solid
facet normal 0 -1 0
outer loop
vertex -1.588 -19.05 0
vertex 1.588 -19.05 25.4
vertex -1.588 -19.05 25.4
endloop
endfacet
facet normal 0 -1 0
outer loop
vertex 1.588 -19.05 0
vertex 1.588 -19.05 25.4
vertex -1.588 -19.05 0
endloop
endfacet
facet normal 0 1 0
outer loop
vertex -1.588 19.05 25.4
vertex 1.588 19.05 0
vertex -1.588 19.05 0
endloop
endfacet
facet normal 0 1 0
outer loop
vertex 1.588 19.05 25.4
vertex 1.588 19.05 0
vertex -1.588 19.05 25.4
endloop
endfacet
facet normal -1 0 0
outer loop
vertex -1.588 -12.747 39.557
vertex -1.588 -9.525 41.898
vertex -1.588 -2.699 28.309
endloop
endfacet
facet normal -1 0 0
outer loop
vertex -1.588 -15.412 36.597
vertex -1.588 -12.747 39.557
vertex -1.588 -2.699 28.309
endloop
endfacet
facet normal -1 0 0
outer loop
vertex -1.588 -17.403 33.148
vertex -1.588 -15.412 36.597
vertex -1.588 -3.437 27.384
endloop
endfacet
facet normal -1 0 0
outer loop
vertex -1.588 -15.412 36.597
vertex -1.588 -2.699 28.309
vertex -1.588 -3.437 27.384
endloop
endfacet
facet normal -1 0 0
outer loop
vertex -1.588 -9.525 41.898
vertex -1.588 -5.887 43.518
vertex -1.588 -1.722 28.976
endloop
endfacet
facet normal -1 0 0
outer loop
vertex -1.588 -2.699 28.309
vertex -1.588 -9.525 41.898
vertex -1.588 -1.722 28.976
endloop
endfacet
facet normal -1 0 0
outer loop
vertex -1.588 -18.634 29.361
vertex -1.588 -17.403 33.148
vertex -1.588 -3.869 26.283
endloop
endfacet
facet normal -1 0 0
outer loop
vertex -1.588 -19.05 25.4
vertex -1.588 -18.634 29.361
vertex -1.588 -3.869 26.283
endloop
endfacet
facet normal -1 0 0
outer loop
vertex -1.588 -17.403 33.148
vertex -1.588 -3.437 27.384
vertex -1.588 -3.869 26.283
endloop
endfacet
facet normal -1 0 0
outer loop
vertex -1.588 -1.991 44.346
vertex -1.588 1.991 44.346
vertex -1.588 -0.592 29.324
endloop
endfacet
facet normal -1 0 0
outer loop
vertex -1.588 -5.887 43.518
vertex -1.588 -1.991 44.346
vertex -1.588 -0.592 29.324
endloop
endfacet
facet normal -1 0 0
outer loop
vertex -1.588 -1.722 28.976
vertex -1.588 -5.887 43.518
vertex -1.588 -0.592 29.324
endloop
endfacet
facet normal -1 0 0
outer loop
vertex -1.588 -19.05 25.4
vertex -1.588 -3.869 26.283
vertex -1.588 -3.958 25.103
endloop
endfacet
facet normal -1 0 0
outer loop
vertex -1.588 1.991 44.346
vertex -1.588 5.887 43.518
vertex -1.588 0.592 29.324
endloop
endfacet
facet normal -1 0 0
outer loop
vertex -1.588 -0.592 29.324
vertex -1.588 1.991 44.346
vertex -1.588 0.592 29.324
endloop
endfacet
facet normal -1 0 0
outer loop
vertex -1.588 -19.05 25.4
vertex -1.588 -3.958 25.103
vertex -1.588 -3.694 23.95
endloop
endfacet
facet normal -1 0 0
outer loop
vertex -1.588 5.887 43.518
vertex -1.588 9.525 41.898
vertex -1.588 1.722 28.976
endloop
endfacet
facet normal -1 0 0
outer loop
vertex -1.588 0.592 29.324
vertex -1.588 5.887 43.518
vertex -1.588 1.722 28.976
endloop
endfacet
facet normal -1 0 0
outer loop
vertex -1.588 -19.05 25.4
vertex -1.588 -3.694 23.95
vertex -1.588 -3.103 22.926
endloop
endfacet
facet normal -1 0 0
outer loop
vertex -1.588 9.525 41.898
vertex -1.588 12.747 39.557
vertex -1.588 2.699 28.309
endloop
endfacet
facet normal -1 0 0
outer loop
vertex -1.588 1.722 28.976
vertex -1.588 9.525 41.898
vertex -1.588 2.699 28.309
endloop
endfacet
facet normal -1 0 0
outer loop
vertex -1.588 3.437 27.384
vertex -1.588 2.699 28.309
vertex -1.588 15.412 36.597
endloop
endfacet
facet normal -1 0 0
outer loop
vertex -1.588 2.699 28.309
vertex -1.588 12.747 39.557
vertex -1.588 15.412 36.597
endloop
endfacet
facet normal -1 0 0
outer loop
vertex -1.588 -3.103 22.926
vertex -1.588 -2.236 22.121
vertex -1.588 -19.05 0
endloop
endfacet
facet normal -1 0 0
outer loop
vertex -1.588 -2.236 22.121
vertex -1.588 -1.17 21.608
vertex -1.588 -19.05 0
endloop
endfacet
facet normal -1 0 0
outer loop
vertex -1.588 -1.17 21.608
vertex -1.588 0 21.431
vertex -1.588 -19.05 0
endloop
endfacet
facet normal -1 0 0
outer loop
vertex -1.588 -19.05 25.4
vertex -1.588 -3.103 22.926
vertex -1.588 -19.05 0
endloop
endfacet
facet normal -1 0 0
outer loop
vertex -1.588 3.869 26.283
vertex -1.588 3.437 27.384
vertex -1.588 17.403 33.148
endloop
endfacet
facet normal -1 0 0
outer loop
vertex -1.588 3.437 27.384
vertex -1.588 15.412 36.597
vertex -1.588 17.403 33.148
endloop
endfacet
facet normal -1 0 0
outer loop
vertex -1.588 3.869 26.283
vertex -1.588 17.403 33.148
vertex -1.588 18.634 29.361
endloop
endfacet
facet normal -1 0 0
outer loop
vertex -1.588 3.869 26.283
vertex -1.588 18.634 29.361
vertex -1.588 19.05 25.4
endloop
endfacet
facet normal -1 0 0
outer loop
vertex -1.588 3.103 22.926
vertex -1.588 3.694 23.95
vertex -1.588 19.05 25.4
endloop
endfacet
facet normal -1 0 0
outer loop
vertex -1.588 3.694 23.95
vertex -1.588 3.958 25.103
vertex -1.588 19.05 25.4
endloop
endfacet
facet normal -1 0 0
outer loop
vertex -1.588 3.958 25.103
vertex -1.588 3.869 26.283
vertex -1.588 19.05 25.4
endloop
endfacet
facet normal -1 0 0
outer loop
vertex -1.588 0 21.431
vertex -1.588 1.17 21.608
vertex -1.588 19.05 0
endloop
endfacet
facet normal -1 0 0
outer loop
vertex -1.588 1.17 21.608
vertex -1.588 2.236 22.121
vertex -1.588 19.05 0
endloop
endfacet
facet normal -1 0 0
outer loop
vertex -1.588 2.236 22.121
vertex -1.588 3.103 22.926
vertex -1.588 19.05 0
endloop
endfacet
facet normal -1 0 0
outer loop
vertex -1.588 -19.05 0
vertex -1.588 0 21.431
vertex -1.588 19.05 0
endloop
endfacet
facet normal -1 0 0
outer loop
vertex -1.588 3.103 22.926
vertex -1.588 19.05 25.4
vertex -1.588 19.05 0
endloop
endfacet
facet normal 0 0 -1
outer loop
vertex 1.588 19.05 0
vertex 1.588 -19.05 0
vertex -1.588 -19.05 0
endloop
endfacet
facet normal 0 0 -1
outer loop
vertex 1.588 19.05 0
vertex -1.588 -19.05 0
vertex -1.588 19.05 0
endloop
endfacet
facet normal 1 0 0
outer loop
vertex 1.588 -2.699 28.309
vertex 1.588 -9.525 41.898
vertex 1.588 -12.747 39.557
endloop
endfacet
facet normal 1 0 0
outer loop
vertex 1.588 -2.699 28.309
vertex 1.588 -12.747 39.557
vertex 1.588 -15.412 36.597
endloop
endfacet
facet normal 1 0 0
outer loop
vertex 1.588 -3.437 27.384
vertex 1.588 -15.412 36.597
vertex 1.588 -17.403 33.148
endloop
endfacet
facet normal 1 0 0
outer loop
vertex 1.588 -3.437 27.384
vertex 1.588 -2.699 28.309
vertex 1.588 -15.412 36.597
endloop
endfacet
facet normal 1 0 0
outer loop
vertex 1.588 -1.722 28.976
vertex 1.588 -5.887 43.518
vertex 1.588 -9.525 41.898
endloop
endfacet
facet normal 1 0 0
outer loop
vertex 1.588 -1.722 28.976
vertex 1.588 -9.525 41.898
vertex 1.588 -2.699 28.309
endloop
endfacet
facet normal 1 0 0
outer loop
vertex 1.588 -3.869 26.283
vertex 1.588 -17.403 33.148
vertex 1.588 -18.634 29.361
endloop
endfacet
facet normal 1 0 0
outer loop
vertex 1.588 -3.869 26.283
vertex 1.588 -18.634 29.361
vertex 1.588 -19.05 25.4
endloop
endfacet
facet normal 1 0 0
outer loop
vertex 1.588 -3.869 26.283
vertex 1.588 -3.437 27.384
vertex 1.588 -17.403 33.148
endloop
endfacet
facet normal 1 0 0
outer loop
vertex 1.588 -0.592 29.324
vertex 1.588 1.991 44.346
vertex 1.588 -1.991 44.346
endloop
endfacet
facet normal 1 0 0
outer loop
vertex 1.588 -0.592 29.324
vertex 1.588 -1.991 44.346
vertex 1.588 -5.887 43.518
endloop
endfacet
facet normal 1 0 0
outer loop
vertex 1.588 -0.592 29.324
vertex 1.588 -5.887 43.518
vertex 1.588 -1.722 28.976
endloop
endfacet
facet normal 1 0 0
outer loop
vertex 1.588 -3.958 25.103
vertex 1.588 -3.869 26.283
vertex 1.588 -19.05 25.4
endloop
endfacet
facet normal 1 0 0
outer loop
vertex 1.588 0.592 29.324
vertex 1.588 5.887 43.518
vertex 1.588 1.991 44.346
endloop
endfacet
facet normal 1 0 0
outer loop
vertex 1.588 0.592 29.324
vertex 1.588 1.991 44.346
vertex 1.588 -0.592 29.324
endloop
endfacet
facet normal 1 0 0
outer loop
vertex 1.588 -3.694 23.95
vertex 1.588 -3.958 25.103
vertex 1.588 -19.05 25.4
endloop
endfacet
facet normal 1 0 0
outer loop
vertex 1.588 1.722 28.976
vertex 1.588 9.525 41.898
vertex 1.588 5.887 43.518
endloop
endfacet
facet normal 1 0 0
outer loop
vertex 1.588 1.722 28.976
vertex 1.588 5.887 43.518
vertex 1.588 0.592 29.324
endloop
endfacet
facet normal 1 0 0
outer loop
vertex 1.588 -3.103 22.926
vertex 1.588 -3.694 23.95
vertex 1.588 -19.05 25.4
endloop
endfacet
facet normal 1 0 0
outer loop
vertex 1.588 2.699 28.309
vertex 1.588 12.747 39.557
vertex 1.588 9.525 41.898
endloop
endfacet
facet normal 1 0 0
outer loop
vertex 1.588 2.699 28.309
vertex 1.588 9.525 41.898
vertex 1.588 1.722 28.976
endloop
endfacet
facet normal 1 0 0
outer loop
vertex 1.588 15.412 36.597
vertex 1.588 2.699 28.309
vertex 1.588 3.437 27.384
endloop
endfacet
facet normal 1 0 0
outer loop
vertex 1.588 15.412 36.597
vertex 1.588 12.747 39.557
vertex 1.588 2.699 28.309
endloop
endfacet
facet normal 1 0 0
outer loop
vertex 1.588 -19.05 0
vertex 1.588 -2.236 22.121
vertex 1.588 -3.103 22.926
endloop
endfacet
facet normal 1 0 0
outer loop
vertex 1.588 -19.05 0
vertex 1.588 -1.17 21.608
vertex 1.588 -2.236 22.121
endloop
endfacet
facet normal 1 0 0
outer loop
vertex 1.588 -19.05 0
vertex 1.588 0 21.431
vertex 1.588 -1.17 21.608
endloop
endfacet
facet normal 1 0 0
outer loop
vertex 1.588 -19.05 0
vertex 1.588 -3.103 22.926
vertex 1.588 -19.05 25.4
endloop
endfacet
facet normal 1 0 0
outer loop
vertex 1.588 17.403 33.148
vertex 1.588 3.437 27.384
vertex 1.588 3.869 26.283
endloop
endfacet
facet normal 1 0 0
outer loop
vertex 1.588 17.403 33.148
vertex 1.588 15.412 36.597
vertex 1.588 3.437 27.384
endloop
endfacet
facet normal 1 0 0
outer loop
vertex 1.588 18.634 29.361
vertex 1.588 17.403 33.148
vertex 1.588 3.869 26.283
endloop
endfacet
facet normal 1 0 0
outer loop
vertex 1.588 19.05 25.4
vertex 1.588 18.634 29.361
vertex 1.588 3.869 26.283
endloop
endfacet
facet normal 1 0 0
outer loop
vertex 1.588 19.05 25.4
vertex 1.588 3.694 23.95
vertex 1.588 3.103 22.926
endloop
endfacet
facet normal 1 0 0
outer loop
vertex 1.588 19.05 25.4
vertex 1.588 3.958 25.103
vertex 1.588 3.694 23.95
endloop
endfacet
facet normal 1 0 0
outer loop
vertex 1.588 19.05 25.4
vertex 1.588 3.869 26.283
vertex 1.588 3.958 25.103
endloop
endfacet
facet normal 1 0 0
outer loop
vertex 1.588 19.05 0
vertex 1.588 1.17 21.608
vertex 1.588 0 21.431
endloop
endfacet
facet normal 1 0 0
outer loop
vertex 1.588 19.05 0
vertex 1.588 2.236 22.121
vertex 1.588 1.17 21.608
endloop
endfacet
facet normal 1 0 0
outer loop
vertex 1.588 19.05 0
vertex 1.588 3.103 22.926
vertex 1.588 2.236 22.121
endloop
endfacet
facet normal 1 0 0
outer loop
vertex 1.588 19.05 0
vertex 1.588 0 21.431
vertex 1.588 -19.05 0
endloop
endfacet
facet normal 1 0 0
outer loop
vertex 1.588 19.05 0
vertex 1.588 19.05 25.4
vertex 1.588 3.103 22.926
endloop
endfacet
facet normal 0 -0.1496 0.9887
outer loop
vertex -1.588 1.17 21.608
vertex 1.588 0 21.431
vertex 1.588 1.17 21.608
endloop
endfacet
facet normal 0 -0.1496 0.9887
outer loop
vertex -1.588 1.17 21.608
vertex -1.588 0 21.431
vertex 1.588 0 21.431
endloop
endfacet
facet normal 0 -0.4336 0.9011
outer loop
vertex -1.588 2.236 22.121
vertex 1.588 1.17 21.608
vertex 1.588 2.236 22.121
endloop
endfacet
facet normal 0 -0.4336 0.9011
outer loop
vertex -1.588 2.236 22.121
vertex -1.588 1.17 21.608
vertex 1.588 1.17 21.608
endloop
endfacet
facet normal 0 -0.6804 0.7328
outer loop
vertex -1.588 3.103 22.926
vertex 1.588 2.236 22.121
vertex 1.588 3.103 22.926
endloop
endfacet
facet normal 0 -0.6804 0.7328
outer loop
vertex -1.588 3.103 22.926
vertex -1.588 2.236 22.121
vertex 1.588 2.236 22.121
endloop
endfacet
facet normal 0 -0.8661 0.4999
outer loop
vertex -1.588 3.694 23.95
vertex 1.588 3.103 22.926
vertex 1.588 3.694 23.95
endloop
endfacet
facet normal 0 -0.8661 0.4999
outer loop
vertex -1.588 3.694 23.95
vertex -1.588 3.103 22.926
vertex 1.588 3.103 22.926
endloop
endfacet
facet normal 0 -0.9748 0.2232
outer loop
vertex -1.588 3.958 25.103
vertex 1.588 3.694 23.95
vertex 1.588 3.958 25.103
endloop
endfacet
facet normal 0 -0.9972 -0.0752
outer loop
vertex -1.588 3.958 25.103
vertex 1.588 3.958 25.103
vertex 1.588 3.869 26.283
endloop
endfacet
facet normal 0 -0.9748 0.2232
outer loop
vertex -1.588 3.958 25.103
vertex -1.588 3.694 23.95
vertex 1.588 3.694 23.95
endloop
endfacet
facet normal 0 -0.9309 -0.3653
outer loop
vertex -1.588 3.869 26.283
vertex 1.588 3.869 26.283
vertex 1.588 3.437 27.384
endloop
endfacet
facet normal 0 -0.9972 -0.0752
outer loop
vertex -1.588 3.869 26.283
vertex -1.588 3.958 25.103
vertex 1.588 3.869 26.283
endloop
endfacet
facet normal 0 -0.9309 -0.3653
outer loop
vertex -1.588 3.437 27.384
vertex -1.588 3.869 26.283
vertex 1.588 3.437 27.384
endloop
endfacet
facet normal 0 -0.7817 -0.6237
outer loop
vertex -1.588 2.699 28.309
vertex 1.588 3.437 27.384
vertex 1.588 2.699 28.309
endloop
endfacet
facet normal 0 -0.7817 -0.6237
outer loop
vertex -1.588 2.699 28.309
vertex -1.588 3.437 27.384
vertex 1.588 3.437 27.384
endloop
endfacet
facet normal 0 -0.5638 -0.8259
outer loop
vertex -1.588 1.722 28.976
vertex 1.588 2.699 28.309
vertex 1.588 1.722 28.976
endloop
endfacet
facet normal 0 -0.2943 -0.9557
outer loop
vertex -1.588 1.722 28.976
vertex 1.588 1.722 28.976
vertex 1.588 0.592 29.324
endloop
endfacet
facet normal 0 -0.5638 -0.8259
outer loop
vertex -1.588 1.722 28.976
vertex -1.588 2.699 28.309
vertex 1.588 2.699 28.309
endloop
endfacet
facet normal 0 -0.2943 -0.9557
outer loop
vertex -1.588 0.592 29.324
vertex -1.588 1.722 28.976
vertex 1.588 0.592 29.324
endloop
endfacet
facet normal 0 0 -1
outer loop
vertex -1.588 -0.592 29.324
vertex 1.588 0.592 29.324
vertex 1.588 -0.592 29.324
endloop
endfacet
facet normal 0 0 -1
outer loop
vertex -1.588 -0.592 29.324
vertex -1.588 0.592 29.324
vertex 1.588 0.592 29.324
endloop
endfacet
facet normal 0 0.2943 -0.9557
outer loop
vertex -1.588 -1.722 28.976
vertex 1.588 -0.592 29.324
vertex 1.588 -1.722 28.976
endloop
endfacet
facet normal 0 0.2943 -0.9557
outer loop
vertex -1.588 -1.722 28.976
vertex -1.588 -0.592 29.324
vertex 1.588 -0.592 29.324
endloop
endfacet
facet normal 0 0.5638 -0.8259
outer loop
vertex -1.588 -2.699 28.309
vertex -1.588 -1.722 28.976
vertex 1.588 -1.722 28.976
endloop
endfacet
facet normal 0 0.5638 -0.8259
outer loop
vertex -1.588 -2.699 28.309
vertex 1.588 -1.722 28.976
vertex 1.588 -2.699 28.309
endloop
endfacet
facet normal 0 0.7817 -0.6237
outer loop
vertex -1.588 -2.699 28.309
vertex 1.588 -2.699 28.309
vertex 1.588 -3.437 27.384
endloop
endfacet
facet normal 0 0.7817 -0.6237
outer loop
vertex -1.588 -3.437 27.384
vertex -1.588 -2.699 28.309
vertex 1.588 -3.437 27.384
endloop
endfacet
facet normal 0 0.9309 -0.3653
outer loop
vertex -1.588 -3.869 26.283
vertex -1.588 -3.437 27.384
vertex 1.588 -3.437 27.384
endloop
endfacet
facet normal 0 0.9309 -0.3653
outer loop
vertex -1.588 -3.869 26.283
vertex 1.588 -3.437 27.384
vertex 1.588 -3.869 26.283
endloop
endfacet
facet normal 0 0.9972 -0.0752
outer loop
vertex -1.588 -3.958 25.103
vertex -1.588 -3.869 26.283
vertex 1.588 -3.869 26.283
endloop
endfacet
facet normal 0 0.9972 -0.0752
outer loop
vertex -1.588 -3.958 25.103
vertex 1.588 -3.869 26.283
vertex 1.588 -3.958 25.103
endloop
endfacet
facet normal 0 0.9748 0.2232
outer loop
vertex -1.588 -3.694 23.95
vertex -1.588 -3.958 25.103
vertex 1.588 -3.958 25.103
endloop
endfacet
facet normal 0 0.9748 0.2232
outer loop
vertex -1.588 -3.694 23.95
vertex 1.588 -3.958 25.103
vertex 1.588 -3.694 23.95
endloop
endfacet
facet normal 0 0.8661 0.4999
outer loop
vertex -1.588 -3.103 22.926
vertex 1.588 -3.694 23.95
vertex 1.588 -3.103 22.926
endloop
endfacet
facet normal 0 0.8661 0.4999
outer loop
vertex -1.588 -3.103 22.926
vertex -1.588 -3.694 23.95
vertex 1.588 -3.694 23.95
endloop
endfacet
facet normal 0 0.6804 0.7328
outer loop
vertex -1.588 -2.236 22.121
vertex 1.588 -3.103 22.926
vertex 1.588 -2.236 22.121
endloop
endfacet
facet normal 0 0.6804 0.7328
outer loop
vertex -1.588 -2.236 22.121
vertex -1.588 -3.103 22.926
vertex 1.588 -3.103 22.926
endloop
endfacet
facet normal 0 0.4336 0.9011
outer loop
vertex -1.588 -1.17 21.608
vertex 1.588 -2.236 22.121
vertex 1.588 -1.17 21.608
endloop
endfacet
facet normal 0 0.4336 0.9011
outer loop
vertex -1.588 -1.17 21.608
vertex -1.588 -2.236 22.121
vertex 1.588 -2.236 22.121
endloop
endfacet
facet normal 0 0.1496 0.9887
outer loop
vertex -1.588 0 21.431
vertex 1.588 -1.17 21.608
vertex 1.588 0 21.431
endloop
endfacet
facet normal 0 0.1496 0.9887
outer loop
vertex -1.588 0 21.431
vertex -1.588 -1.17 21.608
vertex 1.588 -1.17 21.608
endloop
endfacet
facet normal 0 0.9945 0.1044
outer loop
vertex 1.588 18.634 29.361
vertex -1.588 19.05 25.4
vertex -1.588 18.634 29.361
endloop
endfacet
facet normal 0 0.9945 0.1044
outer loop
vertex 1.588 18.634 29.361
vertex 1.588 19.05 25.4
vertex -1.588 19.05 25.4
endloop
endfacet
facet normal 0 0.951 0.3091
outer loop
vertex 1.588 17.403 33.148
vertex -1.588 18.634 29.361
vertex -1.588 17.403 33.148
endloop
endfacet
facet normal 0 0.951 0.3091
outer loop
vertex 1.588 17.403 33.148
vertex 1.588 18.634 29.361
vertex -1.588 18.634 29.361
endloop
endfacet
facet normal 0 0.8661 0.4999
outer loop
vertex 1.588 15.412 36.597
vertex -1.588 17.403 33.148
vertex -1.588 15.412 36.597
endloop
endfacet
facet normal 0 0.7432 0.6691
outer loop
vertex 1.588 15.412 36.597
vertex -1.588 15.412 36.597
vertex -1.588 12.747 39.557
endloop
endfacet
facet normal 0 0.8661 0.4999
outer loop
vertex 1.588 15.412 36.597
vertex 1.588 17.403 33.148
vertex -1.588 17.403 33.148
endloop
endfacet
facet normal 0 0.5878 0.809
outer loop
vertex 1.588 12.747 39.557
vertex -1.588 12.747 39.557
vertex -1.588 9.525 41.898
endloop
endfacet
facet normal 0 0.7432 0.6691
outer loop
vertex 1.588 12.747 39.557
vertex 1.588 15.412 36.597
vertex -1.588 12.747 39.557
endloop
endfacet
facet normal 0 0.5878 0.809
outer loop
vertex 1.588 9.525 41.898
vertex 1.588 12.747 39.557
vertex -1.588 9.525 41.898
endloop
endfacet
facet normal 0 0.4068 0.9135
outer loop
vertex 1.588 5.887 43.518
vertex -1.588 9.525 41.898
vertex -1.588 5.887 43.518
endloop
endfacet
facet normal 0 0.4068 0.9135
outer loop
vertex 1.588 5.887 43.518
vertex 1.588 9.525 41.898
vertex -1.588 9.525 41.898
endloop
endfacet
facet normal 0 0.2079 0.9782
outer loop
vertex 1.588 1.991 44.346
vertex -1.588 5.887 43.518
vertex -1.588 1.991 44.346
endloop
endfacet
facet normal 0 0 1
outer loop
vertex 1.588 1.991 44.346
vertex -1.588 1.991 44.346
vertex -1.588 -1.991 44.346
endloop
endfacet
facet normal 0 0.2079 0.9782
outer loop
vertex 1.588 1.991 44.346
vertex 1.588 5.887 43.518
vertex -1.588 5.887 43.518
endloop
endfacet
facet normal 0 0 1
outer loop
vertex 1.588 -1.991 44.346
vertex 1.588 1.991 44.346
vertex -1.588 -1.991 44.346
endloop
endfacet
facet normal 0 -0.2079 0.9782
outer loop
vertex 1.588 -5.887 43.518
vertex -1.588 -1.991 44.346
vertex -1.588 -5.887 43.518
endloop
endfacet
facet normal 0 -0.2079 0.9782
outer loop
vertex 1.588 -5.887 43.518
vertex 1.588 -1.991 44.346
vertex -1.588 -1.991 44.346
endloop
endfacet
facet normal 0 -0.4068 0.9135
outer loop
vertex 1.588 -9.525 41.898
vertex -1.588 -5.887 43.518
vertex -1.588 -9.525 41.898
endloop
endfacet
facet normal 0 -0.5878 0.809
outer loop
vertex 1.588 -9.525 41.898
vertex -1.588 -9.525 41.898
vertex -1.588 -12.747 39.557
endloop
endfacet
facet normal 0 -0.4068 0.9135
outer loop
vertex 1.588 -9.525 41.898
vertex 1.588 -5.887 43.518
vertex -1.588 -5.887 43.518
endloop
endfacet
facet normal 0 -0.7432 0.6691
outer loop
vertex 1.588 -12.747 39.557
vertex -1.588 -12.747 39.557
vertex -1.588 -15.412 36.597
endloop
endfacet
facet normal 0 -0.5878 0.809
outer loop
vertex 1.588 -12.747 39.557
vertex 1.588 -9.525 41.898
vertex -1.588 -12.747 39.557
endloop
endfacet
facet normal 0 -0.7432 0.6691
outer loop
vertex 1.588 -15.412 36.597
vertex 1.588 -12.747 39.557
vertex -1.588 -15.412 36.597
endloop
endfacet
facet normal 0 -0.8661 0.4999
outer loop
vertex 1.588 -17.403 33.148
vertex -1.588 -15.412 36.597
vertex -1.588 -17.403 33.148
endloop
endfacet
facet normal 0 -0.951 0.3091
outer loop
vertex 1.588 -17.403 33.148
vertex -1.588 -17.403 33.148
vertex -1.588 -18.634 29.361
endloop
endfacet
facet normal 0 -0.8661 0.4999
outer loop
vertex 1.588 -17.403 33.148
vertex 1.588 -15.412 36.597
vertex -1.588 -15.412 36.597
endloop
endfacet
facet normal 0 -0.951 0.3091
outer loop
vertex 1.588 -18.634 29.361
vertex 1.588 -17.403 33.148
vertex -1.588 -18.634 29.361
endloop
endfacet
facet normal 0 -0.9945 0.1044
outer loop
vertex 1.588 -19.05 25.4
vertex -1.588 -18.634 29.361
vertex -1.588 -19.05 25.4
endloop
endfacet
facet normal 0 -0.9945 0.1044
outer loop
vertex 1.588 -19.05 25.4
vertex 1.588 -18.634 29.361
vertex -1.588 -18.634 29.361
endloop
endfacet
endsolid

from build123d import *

# Parameters (mm, degrees)
SKETCH1_R           = 3.96875
BOSS_EXTRUDE1_DEPTH = 1.5875


with BuildPart() as part:
    # Sketch1 → Boss-Extrude1 (new body, symmetric)
    with BuildSketch(Plane(origin=(0, 0, 0), x_dir=(0, 0, -1), z_dir=(1, 0, 0))):
        with BuildLine():
            Line((-25.4, -19.05), (0, -19.05))
            Line((0, -19.05), (0, 19.05))
            Line((0, 19.05), (-25.4, 19.05))
            ThreePointArc((-25.4, 19.05), (-44.45, 0), (-25.4, -19.05))
        make_face()
        with Locations((-25.4, 0)):
            Circle(SKETCH1_R, mode=Mode.SUBTRACT)
    extrude(amount=BOSS_EXTRUDE1_DEPTH, both=True)


solid = part.part
